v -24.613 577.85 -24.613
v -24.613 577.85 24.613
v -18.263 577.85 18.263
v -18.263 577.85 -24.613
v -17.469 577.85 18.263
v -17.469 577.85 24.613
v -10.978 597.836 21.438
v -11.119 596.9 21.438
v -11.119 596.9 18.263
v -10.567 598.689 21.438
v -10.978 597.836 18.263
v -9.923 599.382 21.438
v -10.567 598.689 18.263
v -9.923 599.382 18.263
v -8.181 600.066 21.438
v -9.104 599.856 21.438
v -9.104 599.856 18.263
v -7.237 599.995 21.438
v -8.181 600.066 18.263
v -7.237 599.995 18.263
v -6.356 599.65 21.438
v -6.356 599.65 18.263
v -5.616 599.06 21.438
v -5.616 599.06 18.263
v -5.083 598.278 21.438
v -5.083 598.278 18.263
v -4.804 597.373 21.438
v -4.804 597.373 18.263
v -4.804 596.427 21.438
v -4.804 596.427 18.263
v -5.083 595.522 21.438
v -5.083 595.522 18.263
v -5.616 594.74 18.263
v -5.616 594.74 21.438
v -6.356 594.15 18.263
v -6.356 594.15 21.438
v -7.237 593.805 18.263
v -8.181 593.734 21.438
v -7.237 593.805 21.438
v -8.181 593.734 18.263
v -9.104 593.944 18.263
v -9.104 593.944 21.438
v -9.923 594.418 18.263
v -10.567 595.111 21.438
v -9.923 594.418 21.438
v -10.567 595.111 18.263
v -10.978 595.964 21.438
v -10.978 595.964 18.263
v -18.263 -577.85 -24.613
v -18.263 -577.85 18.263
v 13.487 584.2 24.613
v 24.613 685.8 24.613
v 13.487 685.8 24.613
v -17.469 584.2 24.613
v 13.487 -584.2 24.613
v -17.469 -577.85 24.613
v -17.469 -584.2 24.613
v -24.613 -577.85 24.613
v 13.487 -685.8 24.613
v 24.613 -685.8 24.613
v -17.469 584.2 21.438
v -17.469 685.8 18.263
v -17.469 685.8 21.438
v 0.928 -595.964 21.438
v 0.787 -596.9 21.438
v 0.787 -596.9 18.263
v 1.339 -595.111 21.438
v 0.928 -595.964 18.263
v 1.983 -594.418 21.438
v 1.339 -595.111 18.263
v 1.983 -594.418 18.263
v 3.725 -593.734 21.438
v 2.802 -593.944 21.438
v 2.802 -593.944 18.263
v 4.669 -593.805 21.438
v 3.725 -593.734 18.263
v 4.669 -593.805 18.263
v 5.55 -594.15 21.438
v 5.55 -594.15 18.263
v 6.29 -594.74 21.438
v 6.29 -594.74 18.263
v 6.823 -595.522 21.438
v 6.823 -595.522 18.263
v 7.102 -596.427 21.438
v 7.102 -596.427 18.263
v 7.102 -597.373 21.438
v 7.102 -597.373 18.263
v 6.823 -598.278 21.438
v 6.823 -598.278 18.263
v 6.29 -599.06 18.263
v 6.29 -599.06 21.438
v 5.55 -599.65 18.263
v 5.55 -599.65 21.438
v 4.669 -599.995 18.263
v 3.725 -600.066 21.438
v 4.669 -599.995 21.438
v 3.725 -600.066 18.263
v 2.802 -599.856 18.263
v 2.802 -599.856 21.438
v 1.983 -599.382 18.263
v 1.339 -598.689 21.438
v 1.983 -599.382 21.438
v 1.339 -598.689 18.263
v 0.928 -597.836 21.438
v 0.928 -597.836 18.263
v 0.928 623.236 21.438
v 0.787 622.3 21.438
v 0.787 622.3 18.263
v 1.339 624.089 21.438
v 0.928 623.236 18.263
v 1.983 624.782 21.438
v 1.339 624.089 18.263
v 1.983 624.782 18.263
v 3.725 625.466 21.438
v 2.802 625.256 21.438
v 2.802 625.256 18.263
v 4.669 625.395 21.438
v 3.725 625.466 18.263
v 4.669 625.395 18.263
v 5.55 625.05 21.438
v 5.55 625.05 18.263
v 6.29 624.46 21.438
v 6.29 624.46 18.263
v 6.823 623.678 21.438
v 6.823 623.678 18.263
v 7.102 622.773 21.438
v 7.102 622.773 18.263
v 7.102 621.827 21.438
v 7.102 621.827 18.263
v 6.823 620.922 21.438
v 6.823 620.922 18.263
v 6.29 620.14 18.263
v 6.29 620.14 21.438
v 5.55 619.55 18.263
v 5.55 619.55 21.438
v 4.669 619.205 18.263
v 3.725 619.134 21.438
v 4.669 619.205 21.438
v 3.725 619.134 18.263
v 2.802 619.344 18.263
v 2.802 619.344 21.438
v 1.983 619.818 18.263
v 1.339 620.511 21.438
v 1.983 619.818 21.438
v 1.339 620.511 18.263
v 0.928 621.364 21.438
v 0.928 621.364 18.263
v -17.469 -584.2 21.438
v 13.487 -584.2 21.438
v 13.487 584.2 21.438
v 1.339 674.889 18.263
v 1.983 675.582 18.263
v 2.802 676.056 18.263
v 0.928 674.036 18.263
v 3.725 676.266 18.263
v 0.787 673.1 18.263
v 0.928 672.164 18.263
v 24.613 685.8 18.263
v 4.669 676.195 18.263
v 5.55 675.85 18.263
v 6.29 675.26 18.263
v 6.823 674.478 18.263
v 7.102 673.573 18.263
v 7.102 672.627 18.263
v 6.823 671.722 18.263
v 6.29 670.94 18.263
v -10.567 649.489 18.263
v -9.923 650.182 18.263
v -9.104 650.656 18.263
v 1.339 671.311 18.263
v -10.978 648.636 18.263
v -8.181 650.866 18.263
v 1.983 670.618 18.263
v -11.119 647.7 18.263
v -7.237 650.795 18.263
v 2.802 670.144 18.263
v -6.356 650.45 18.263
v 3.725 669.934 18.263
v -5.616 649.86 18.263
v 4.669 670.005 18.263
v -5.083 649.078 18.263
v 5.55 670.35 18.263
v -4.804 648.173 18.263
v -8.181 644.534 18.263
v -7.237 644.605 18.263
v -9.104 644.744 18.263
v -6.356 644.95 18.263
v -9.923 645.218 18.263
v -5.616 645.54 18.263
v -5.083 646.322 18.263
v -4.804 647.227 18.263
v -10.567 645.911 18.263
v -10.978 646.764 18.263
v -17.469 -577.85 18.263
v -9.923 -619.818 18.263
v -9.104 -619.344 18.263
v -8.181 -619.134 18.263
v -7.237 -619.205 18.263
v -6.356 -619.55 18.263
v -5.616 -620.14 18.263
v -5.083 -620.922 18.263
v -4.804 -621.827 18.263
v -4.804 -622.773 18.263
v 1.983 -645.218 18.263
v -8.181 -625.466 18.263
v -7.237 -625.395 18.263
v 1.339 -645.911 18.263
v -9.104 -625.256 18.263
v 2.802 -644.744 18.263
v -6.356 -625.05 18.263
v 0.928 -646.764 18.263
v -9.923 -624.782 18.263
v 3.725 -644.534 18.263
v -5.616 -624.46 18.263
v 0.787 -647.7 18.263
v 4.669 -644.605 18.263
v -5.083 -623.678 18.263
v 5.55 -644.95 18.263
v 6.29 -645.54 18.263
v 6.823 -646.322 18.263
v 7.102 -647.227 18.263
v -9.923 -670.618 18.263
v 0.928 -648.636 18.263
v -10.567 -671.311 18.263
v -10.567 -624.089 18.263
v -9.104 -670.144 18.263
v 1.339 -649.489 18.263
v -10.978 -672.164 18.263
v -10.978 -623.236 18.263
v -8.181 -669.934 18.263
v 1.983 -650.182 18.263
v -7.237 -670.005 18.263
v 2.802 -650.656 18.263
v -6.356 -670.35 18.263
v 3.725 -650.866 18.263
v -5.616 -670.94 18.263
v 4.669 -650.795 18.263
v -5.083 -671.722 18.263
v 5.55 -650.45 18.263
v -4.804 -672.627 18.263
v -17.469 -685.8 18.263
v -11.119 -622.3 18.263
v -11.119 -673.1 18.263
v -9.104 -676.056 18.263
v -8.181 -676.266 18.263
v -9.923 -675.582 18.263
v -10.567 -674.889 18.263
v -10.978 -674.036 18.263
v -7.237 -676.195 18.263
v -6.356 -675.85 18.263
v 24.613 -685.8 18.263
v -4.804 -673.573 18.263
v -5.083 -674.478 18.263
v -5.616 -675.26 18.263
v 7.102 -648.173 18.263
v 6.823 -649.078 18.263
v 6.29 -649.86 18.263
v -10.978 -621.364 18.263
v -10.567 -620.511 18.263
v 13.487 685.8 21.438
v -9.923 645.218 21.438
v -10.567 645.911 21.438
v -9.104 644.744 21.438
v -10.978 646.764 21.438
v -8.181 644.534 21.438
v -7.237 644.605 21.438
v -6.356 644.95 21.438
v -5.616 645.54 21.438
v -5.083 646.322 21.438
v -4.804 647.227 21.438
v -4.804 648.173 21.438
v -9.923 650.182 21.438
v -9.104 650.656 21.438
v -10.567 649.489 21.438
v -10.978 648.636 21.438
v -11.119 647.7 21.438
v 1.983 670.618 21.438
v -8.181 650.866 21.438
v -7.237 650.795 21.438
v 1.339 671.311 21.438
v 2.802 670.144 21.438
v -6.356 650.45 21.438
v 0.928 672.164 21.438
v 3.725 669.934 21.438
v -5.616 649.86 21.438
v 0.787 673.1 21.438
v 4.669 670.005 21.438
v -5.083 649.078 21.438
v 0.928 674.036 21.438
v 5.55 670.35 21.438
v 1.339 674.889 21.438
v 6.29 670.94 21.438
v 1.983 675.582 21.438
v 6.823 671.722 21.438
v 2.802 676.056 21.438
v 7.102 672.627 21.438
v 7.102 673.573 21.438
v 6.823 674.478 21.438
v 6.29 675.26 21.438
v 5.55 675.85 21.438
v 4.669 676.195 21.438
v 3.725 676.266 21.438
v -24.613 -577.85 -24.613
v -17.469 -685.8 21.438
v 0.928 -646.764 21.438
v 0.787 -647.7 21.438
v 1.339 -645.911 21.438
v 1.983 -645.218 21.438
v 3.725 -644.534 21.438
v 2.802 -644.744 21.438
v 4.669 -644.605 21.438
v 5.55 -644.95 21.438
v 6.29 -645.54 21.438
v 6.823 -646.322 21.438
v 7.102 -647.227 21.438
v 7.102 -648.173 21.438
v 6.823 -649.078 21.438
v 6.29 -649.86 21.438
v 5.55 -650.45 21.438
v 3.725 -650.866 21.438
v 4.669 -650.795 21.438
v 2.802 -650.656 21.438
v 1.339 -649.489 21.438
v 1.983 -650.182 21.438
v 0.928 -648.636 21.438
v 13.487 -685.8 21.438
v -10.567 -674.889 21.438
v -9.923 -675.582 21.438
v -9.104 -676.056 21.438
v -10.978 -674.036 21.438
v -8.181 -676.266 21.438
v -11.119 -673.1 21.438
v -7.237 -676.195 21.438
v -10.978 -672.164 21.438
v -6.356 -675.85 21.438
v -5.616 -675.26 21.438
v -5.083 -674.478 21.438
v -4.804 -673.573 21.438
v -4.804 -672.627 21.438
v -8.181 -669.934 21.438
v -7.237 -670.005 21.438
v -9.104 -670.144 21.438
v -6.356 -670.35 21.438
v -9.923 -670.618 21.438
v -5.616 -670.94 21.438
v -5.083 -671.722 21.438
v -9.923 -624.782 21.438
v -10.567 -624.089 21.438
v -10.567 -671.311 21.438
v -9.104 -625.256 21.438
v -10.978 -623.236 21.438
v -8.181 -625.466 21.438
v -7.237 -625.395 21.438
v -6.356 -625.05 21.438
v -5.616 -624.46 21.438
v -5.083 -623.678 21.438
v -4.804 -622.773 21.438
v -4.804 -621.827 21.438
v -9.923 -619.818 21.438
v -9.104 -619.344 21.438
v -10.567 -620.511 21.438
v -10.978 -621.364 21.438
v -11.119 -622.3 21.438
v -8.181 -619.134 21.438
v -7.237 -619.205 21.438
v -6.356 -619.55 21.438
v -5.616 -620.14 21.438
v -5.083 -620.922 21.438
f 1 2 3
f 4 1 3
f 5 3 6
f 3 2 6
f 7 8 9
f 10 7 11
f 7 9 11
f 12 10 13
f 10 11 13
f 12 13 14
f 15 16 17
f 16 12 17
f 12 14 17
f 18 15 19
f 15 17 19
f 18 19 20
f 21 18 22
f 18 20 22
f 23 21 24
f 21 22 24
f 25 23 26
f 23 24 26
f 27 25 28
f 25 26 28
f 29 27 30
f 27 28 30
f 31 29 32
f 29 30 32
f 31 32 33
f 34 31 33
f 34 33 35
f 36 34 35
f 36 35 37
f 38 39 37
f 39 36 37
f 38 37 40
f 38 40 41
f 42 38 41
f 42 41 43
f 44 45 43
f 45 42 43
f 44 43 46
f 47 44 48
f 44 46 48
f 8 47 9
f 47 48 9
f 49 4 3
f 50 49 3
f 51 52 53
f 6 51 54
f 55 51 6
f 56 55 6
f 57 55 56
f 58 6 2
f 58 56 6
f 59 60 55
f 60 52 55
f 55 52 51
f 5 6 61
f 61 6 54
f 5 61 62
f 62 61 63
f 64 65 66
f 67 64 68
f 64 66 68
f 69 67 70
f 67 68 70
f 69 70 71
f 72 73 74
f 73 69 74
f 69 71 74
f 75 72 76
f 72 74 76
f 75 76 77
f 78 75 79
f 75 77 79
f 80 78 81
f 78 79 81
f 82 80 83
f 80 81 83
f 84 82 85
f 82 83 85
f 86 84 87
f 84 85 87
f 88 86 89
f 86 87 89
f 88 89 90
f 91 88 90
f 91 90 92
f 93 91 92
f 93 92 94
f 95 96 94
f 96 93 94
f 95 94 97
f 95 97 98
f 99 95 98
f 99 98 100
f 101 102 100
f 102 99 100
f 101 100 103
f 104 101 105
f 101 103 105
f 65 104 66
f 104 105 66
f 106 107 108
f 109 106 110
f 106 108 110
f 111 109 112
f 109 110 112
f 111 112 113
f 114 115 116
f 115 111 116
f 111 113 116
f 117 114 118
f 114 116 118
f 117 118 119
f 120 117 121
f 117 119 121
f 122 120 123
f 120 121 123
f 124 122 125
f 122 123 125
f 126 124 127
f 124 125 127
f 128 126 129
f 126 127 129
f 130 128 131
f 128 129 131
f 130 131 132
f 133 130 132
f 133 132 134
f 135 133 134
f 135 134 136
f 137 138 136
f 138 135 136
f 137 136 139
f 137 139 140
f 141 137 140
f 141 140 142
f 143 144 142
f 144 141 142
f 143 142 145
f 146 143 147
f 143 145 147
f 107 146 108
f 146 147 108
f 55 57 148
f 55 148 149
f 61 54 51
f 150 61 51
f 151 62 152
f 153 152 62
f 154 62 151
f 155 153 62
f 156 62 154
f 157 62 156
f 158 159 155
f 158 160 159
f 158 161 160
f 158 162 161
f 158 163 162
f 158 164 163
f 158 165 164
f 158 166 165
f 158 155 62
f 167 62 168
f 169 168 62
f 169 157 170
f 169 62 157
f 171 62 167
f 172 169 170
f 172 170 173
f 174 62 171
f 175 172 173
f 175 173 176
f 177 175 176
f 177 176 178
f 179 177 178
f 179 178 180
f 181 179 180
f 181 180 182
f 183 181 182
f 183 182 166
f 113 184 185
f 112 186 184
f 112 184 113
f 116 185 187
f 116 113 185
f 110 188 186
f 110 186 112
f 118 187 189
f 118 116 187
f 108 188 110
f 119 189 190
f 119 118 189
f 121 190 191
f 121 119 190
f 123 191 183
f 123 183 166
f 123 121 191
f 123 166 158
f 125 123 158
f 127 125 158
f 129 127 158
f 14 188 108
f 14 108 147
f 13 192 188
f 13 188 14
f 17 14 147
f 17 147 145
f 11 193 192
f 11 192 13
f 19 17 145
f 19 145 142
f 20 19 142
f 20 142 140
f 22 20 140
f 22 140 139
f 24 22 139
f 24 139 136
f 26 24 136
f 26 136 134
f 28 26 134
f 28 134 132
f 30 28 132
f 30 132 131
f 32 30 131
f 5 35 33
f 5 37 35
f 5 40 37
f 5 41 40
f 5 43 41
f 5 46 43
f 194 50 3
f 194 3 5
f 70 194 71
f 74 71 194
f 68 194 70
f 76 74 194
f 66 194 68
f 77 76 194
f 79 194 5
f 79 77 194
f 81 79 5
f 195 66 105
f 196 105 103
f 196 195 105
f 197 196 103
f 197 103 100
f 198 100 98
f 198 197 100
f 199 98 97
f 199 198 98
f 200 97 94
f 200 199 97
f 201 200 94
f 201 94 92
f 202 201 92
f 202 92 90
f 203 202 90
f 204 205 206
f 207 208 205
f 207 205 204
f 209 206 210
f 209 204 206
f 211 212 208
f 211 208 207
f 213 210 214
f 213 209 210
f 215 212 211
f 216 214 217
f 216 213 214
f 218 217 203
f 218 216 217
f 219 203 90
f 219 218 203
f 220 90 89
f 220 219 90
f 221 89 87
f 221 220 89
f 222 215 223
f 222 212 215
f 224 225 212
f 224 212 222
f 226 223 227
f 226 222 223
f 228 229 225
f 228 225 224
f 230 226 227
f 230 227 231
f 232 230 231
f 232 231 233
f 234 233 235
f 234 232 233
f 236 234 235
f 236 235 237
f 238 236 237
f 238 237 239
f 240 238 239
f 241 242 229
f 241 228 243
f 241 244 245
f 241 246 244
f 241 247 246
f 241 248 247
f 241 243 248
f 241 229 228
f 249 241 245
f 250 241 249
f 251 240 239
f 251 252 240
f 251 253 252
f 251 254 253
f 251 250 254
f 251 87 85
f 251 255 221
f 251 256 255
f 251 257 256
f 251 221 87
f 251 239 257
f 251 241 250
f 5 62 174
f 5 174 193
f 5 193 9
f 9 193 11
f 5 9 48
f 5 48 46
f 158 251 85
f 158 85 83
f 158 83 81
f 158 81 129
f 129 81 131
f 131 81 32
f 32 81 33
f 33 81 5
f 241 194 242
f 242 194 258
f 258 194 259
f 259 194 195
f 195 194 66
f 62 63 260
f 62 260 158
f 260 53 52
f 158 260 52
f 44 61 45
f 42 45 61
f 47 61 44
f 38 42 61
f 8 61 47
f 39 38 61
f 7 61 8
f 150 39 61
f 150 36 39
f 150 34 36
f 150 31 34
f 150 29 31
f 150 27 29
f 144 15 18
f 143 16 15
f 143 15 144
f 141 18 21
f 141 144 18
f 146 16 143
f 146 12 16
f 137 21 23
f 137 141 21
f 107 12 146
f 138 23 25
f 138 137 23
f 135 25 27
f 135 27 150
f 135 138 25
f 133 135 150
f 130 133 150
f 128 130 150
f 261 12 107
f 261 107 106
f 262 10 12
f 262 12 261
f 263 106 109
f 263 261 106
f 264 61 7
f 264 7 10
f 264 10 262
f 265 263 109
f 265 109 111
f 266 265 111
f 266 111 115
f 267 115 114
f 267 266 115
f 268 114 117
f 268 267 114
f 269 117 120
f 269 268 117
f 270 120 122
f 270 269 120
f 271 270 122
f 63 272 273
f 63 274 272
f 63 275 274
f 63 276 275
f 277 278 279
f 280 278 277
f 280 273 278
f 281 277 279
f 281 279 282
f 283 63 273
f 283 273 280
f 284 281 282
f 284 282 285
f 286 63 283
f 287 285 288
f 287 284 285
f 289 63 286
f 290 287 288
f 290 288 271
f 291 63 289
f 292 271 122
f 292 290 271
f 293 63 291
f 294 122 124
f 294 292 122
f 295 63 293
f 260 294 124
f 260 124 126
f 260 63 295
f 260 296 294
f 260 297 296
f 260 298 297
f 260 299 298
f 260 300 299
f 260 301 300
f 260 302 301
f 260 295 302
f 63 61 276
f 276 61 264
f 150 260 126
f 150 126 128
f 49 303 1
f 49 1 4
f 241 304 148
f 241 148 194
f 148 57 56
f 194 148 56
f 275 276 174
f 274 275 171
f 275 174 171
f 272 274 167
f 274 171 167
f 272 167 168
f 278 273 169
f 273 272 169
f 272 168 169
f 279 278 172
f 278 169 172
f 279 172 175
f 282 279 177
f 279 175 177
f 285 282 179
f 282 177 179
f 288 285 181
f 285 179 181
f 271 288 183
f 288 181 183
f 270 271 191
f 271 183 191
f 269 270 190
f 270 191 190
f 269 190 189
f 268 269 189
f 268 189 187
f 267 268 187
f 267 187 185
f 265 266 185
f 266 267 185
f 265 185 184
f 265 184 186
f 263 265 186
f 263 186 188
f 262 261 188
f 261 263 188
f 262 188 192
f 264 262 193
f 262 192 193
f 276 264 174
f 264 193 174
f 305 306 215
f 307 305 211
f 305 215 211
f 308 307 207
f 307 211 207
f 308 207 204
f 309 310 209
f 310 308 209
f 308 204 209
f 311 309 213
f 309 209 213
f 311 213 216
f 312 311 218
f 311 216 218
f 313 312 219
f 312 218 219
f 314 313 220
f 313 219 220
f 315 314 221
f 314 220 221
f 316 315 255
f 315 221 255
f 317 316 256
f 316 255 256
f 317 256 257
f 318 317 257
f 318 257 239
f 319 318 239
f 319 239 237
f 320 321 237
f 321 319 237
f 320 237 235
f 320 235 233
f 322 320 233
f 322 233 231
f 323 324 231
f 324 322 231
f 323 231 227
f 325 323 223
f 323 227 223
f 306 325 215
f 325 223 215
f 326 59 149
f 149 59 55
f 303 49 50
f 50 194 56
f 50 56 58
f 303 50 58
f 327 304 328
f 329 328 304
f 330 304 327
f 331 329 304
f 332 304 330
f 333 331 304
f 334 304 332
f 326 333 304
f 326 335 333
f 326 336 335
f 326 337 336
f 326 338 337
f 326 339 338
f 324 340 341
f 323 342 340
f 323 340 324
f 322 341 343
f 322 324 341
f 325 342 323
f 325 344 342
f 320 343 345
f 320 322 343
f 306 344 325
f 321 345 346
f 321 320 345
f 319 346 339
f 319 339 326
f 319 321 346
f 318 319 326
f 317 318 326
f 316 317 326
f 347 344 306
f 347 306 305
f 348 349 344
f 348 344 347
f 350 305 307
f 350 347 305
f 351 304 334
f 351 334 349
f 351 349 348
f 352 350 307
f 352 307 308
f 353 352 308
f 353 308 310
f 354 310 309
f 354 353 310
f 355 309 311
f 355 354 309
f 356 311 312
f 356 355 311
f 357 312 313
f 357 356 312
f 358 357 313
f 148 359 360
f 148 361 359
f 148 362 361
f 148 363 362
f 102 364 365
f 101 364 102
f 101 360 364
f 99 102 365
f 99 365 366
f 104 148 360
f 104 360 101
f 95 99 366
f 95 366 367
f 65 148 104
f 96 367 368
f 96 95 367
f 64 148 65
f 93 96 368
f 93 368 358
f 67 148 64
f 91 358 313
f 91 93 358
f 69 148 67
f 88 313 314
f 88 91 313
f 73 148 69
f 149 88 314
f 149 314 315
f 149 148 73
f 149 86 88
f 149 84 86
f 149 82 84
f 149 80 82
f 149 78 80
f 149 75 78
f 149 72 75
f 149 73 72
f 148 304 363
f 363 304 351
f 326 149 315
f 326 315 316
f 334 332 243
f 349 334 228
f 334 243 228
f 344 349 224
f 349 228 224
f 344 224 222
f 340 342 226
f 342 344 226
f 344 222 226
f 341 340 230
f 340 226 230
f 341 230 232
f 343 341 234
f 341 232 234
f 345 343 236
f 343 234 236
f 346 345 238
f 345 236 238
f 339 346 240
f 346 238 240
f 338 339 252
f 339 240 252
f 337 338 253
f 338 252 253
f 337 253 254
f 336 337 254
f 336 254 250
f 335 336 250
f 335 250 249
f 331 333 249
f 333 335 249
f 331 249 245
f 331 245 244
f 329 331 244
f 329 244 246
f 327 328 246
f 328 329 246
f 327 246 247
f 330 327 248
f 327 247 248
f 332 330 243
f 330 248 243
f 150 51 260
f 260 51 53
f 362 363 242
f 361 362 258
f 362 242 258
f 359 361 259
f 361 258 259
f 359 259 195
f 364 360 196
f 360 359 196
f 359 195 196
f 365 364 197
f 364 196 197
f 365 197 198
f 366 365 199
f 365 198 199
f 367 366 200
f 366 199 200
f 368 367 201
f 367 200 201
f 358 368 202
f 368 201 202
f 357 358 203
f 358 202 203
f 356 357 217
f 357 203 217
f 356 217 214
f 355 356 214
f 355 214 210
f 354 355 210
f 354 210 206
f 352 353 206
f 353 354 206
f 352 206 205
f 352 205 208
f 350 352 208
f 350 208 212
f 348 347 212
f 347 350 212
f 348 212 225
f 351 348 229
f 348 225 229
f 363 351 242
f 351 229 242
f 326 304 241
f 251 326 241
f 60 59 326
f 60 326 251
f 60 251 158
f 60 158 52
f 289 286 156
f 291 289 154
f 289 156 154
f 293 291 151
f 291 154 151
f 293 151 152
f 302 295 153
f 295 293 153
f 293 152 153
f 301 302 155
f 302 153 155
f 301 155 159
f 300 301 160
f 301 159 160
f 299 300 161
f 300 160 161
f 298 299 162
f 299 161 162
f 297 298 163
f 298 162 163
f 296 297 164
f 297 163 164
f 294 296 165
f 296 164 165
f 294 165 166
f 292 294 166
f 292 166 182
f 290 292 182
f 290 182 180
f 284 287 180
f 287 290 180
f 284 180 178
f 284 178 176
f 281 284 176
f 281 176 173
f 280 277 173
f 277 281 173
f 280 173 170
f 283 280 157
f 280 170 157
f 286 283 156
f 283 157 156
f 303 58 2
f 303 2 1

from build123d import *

# Parameters (mm, degrees)
F1_DEPTH = 685.8
F2_W     = 30.95625
F2_H     = 101.6
F2_R     = 3.175
F3_DEPTH = 3.175
F4_DEPTH = 49.2262
F5_D     = 6.35


with BuildPart() as f1:
    # F0 (on Front) → F1 (new body, symmetric)
    with BuildSketch(Plane.XZ):
        Polygon((-24.6126, -24.6126), (-18.2626, -24.6126), (-18.2626, 18.2626), (24.6126, 18.2626), (24.6126, 24.6126), (-24.6126, 24.6126), align=None)
    extrude(amount=F1_DEPTH, both=True)

    # F2 (on face) → F3 (cut)
    with BuildSketch(Plane.XY.offset(24.6126)):
        with Locations((-1.990725, -635)):
            Rectangle(F2_W, F2_H)
        with Locations((-7.94385, -673.1)):
            Circle(F2_R, mode=Mode.SUBTRACT)
        with Locations((-7.94385, -622.3)):
            Circle(F2_R, mode=Mode.SUBTRACT)
        with Locations((3.9624, -647.7)):
            Circle(F2_R, mode=Mode.SUBTRACT)
        with Locations((3.9624, -596.9)):
            Circle(F2_R, mode=Mode.SUBTRACT)
        with Locations((-1.990725, 635)):
            Rectangle(F2_W, F2_H)
        with Locations((-7.94385, 596.9)):
            Circle(F2_R, mode=Mode.SUBTRACT)
        with Locations((-7.94385, 647.7)):
            Circle(F2_R, mode=Mode.SUBTRACT)
        with Locations((3.9624, 622.3)):
            Circle(F2_R, mode=Mode.SUBTRACT)
        with Locations((3.9624, 673.1)):
            Circle(F2_R, mode=Mode.SUBTRACT)
    extrude(amount=-F3_DEPTH, mode=Mode.SUBTRACT)

    # F2 (on face) → F4 (cut, through all)
    with BuildSketch(Plane.XY.offset(24.6126)):
        Polygon((-24.6126, 685.8), (-24.6126, 577.85), (-17.46885, 577.85), (-17.46885, 584.2), (-17.46885, 685.8), align=None)
        Polygon((-24.6126, -577.85), (-24.6126, -685.8), (-17.46885, -685.8), (-17.46885, -584.2), (-17.46885, -577.85), align=None)
    extrude(amount=-F4_DEPTH, mode=Mode.SUBTRACT)

    # F5 (through all)
    with Locations(Plane.XY.offset(24.6126)):
        with Locations((-7.94385, -673.1), (3.9624, -647.7), (-7.94385, -622.3), (3.9624, -596.9), (-7.94385, 647.7), (3.9624, 673.1), (3.9624, 622.3), (-7.94385, 596.9)):
            Hole(F5_D / 2)


solid = f1.part
